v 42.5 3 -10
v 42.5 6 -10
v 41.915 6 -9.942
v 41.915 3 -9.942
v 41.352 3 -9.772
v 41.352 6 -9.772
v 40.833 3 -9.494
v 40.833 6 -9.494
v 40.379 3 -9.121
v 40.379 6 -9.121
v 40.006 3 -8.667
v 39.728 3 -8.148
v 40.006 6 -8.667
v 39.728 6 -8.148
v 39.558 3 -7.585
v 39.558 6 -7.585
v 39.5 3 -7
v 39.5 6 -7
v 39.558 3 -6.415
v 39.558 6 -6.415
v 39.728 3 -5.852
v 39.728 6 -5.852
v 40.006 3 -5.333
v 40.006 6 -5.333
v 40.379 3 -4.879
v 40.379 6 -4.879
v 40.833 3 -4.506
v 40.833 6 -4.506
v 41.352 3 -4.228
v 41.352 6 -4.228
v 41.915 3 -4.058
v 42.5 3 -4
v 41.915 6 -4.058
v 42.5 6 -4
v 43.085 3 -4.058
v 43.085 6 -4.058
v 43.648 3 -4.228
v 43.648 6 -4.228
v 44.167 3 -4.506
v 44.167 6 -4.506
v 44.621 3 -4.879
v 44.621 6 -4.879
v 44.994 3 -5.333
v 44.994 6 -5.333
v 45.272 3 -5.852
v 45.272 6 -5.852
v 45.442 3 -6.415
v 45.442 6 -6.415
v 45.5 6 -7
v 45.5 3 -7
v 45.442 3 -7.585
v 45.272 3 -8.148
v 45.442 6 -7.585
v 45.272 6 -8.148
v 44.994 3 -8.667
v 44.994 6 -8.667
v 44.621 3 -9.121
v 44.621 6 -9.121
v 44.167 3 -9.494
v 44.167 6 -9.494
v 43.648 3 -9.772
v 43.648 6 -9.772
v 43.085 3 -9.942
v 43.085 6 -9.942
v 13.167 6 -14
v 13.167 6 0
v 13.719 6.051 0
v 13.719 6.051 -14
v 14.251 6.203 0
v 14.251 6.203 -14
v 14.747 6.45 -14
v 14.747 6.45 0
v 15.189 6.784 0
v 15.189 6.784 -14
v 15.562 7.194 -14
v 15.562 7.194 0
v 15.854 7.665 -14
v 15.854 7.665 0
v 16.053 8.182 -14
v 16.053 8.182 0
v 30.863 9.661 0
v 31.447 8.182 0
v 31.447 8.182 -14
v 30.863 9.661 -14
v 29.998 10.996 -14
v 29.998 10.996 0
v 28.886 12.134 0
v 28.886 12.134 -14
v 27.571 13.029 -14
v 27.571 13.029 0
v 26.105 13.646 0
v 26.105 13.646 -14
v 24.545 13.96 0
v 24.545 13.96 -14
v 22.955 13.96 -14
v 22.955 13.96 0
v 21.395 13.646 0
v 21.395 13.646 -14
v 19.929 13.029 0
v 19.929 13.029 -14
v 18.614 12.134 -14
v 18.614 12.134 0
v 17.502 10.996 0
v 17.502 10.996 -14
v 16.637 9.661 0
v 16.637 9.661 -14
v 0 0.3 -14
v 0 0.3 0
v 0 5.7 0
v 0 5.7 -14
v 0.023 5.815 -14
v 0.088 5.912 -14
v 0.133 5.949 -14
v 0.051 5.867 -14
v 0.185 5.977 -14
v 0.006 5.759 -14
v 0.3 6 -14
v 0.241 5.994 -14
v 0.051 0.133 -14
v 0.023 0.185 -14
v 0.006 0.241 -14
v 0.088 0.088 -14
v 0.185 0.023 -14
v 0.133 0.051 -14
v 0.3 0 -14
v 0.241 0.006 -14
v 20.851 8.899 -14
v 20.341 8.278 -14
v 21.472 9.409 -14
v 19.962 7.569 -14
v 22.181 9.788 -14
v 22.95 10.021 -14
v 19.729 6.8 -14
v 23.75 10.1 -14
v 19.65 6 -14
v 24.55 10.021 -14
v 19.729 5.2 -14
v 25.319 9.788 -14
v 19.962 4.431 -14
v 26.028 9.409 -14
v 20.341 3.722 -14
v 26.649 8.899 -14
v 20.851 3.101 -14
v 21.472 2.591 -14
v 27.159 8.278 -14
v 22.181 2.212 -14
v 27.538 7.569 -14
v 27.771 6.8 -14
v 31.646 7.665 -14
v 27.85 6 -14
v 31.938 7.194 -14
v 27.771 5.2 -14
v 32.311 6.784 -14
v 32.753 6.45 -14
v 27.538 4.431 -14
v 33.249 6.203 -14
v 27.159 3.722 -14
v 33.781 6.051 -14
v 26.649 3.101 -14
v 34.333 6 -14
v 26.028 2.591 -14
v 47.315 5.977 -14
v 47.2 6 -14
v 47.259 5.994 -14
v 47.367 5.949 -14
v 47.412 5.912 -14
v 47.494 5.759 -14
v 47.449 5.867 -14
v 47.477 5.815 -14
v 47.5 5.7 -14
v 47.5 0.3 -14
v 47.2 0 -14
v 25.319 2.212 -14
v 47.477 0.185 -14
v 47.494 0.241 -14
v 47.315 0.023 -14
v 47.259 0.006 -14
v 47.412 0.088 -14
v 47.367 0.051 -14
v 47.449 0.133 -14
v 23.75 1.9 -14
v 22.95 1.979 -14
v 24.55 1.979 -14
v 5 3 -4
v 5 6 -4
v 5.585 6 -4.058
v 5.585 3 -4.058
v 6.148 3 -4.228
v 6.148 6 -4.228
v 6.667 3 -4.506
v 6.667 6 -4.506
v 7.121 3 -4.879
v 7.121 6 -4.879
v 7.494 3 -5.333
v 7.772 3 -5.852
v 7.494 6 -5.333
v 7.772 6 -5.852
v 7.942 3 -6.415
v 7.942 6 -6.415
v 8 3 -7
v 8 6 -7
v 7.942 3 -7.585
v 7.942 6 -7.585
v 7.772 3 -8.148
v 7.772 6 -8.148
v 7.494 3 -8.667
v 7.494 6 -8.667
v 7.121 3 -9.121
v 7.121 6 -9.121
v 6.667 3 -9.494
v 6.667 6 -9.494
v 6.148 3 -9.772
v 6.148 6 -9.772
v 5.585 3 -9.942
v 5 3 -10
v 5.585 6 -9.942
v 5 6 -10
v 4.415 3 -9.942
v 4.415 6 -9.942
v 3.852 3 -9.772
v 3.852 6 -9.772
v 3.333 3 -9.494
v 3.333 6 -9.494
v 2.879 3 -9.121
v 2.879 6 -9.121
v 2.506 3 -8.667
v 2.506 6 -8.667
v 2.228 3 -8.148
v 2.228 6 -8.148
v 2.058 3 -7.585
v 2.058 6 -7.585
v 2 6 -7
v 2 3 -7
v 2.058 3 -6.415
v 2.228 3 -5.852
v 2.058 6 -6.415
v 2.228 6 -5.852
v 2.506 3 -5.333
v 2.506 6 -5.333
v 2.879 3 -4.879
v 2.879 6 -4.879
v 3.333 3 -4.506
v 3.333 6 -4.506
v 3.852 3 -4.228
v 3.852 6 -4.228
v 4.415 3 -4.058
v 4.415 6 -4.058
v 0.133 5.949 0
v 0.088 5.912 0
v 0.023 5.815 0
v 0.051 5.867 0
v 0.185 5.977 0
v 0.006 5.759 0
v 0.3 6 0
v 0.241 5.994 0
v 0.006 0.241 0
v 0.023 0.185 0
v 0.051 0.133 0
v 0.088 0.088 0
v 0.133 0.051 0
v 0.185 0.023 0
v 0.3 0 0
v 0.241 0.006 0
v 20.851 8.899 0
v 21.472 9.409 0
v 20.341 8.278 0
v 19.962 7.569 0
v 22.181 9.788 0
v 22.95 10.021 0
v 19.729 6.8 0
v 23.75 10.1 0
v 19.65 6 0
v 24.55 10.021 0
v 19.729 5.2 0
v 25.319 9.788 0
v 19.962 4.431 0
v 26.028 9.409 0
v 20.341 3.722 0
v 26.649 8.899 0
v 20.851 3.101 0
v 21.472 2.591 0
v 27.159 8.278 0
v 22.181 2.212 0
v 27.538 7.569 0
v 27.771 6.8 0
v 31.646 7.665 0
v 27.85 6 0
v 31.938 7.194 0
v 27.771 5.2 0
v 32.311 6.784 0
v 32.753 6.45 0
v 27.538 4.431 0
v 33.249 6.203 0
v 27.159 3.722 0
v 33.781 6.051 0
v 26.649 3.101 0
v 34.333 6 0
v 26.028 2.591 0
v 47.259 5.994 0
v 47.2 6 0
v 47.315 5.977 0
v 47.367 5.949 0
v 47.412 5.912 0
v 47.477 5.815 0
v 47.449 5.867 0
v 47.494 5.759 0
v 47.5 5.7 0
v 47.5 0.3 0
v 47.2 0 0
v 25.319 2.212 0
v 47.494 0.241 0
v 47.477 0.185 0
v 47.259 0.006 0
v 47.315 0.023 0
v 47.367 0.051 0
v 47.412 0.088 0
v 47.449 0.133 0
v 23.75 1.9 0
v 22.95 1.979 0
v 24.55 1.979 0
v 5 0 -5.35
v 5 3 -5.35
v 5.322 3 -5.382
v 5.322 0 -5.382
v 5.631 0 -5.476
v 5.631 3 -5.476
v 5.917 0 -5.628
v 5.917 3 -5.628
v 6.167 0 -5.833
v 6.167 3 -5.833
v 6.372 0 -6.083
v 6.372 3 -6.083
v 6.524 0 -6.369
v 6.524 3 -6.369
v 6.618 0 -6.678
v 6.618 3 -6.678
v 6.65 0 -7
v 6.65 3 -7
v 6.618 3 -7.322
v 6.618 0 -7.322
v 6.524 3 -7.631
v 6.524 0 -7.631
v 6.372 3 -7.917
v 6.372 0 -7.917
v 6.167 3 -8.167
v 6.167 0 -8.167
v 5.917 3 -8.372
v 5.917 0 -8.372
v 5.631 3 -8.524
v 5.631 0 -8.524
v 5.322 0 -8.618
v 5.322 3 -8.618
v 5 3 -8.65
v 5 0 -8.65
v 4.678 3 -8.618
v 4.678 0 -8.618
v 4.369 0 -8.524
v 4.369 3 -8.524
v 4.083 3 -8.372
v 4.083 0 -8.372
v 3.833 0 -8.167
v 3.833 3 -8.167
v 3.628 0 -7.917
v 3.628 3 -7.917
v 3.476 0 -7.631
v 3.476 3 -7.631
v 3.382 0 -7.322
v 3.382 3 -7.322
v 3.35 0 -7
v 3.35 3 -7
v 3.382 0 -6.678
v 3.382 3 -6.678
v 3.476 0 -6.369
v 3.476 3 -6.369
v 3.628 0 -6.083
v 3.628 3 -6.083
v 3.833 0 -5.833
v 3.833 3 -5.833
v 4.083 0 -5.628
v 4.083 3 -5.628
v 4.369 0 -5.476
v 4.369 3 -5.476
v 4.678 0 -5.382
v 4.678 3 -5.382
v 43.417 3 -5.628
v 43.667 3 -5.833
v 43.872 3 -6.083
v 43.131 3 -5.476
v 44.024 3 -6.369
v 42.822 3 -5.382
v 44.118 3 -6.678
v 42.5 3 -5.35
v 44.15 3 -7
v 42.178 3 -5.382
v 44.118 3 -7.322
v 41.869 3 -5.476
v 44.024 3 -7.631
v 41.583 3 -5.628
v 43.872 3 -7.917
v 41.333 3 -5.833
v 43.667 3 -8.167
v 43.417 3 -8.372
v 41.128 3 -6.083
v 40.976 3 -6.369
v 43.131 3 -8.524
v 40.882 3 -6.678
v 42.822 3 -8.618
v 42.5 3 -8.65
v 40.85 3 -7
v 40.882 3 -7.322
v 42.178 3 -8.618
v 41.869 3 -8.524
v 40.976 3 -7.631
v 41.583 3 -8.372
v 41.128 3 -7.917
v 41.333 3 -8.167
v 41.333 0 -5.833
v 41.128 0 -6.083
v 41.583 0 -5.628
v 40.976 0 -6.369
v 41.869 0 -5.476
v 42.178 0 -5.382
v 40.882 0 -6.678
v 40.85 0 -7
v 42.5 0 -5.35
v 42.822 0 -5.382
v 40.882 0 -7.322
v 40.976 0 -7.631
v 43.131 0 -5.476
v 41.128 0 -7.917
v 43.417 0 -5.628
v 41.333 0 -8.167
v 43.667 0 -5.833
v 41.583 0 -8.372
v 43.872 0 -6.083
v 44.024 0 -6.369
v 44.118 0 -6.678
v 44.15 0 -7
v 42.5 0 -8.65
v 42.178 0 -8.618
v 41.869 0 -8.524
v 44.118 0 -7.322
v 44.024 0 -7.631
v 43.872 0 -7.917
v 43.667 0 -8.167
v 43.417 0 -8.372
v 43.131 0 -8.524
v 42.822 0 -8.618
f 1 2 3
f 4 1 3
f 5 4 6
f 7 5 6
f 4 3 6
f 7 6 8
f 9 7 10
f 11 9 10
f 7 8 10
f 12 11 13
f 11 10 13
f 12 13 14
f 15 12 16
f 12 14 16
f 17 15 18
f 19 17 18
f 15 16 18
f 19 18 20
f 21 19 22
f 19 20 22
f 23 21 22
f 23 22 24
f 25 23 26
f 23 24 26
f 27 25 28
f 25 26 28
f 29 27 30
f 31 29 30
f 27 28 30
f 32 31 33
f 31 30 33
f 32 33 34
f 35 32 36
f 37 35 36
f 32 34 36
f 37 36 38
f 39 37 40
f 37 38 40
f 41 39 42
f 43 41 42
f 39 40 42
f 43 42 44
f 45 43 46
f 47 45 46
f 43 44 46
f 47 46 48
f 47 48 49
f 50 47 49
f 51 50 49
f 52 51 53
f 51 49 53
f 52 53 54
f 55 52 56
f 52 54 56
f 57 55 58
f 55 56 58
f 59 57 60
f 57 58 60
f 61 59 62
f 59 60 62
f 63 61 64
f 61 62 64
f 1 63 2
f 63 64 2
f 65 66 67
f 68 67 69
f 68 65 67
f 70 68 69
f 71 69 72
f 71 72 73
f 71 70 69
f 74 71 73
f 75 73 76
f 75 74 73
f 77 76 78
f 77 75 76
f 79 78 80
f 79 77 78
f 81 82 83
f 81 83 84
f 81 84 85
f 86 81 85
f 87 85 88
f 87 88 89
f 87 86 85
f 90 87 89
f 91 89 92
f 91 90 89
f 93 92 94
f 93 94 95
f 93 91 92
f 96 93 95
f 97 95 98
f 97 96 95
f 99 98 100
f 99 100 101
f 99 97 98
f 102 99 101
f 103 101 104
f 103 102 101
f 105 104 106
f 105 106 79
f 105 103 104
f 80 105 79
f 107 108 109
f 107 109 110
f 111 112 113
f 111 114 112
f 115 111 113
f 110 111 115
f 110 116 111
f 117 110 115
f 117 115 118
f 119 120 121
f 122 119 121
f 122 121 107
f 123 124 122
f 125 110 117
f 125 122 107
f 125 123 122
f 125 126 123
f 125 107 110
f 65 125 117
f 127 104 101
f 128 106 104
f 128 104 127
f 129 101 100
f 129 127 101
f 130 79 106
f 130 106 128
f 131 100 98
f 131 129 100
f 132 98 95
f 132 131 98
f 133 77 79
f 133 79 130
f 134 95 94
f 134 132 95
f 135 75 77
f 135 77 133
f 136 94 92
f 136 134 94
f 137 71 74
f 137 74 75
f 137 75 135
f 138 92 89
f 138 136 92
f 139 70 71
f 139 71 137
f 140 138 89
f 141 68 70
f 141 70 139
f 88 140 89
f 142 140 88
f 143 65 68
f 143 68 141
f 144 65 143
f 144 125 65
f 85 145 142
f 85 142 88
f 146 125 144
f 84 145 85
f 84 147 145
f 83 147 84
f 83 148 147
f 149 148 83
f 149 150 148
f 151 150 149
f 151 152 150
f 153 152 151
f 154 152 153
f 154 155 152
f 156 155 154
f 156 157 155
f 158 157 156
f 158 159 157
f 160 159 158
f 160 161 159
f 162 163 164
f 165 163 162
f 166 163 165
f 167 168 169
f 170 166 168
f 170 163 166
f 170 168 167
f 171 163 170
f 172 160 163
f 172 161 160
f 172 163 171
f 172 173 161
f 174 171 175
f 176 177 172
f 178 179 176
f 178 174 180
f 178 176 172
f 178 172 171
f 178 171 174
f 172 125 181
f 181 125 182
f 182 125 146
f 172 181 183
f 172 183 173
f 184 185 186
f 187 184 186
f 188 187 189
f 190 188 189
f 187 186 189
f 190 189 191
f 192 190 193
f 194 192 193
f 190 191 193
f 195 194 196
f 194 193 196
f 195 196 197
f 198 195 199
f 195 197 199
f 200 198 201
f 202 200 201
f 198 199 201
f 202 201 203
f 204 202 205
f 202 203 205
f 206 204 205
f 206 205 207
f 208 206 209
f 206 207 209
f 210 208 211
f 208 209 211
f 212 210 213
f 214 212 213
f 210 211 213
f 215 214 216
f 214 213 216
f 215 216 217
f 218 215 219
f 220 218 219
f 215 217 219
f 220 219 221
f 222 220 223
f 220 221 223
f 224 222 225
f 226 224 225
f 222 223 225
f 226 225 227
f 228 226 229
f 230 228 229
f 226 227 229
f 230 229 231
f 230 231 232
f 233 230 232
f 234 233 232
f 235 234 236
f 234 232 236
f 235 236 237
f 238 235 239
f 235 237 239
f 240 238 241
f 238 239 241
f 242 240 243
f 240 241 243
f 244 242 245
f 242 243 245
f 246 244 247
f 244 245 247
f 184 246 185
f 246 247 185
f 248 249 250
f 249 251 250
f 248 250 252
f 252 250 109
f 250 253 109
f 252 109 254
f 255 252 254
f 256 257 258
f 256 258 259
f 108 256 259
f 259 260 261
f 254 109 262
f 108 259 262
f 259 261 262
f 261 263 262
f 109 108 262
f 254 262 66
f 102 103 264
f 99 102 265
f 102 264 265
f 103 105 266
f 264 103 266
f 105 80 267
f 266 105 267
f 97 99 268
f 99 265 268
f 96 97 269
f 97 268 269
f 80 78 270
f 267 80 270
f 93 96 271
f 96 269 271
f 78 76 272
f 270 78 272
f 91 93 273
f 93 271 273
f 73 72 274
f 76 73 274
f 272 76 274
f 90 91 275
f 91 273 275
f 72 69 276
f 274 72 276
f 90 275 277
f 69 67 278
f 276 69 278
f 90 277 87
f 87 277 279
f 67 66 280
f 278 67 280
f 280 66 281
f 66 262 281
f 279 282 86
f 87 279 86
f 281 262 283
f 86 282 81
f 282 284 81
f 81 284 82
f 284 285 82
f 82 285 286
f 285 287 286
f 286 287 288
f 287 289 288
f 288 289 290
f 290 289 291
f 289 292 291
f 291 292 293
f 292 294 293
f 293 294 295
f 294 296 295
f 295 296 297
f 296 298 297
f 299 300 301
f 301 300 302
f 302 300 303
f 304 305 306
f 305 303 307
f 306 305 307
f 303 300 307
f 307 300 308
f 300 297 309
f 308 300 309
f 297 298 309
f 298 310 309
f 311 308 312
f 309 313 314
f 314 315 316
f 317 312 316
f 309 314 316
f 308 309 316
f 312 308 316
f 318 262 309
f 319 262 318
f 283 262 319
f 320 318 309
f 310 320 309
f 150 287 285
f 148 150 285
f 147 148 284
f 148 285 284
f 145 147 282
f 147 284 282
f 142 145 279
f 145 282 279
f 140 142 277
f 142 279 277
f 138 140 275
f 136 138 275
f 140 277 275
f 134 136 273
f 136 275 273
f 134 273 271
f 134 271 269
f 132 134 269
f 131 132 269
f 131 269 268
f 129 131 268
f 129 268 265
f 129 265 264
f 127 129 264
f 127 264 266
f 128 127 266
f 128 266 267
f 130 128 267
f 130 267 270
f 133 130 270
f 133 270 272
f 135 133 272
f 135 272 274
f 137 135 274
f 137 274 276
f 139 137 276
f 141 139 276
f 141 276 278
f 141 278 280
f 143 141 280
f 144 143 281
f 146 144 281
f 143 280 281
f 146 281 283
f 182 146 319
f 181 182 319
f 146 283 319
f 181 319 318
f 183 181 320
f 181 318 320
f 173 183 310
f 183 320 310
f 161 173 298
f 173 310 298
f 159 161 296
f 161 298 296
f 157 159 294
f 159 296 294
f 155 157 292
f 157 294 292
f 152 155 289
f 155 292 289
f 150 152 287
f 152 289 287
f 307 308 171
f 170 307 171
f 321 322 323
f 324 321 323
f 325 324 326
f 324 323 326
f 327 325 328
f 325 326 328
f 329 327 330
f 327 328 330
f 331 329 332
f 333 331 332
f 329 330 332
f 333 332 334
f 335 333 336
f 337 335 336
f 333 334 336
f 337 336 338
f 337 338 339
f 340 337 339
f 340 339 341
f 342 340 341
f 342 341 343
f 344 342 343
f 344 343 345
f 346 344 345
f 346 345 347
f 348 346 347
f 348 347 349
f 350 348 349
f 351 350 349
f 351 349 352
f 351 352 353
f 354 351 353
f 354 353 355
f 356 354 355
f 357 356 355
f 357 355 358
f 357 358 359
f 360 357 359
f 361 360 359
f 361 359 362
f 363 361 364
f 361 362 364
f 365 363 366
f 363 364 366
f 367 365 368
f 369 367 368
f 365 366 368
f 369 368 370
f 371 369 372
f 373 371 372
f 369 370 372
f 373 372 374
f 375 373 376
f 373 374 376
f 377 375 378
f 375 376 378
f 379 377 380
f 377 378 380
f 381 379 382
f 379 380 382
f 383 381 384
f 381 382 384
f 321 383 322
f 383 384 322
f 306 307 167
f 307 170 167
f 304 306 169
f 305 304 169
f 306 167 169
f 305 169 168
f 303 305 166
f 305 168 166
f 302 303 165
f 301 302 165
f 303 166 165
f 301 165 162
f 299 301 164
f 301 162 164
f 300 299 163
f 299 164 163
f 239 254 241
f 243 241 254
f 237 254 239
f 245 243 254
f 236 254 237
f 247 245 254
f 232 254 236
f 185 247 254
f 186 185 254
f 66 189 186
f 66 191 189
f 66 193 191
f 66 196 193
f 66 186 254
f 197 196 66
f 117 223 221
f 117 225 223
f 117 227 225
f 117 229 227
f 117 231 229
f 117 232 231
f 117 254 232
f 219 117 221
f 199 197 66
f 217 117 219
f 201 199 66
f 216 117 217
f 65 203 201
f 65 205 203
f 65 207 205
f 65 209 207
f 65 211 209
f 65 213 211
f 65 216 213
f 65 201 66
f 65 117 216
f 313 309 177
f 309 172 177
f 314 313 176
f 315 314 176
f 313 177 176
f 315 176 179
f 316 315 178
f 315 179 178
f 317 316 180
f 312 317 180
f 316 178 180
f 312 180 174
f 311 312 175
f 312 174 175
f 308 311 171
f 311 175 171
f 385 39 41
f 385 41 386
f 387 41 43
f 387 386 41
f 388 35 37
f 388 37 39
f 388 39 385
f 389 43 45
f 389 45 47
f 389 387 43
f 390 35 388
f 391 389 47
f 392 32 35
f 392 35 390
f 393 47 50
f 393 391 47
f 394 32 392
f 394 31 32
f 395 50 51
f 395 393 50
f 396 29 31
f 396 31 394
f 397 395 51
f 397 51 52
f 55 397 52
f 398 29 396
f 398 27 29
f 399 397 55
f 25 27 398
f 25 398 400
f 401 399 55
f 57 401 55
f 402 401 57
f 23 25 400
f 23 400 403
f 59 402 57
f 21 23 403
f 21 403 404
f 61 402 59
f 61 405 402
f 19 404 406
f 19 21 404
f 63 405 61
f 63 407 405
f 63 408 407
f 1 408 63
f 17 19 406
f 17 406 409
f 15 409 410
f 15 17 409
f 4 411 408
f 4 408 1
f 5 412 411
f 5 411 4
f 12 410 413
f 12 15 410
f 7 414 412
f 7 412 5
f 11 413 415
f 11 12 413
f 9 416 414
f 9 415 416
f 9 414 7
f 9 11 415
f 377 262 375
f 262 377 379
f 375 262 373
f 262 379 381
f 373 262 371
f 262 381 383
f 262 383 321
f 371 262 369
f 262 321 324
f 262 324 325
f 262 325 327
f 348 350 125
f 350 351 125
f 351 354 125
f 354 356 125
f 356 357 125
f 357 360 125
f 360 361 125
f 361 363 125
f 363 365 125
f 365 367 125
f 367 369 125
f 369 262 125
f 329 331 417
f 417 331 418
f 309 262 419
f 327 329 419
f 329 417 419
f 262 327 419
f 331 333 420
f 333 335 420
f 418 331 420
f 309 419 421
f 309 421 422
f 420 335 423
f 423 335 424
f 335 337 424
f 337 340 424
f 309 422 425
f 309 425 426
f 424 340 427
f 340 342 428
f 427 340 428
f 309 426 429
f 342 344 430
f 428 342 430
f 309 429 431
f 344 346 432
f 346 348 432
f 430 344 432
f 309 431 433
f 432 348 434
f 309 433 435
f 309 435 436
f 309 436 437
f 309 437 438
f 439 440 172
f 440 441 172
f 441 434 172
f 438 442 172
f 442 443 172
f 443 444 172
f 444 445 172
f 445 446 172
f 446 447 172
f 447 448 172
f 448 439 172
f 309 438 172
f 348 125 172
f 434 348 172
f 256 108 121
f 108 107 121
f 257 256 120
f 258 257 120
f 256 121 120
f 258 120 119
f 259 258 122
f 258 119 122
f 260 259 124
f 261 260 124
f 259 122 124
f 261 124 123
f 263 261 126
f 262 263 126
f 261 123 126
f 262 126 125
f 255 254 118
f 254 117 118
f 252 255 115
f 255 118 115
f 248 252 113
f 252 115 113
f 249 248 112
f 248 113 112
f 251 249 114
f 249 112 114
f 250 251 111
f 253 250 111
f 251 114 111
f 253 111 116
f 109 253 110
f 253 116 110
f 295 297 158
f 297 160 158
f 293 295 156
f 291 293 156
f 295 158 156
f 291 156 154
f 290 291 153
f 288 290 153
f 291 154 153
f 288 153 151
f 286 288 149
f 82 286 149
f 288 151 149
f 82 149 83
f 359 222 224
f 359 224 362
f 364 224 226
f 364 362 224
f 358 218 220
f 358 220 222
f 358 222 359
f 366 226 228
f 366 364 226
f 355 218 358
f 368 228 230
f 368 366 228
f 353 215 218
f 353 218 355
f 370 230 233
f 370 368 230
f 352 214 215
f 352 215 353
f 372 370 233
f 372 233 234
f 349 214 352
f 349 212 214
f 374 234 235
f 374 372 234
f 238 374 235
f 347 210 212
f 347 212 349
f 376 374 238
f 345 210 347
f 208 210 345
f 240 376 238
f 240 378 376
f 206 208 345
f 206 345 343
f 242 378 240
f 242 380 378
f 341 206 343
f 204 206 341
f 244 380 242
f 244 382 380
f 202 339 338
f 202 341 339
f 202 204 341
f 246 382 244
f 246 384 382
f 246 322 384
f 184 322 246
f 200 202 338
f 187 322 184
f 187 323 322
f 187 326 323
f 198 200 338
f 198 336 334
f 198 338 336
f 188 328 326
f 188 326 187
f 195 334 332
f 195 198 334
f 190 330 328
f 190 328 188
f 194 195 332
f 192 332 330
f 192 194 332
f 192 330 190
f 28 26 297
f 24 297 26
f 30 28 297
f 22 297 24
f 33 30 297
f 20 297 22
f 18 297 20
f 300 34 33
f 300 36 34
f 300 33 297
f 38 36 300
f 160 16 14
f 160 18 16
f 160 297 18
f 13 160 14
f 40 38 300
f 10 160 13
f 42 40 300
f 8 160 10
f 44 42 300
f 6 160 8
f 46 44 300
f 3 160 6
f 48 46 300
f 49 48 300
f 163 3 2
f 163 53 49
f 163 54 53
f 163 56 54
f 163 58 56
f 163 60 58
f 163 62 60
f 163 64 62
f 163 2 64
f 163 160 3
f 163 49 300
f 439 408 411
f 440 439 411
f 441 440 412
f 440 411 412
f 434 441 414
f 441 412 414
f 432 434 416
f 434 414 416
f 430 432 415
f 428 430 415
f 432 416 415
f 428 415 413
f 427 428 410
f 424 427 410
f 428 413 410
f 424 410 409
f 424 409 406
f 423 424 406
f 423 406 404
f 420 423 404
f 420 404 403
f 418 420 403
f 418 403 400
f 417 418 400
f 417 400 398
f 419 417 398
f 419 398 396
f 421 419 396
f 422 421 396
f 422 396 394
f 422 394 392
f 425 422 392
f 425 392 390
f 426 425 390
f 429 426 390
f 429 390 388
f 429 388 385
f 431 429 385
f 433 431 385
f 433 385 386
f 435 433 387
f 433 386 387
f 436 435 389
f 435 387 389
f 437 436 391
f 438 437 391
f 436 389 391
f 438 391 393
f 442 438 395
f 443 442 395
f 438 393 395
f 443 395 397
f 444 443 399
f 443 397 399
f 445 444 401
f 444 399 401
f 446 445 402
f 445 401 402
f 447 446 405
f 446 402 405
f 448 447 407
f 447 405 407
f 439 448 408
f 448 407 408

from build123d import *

# Parameters (mm, degrees)
SKETCH1_W           = 47.5
SKETCH1_H           = 14
BOSS_EXTRUDE1_DEPTH = 6
BOSS_EXTRUDE2_DEPTH = 14
SKETCH4_R           = 4.1
CUT_EXTRUDE1_DEPTH  = 52.461150395
SKETCH5_R           = 1.65
CUT_EXTRUDE2_DEPTH  = 51.162236792
SKETCH6_R           = 3
CUT_EXTRUDE3_DEPTH  = 3
FILLET1_R           = 3
FILLET2_R           = 0.3


with BuildPart() as part:
    # Sketch1 → Boss-Extrude1 (new body)
    with BuildSketch(Plane(origin=(0, 0, 0), x_dir=(1, 0, 0), z_dir=(0, 1, 0))):
        with Locations((23.75, 7)):
            Rectangle(SKETCH1_W, SKETCH1_H)
    extrude(amount=BOSS_EXTRUDE1_DEPTH)

    # Sketch3 → Boss-Extrude2 (add)
    with BuildSketch(Plane.XY):
        with BuildLine():
            Line((15.75, 2.184089353), (16.718725156, 2.184089353))
            Line((16.718725156, 2.184089353), (30.781274844, 2.184089353))
            Line((30.781274844, 2.184089353), (31.75, 2.184089353))
            Line((31.75, 2.184089353), (31.75, 6))
            ThreePointArc((31.75, 6), (23.75, 14), (15.75, 6))
            Line((15.75, 6), (15.75, 2.184089353))
        make_face()
    extrude(amount=-BOSS_EXTRUDE2_DEPTH)

    # Sketch4 → Cut-Extrude1 (cut, through all)
    with BuildSketch(Plane.XY):
        with Locations((23.75, 6)):
            Circle(SKETCH4_R)
    extrude(amount=-CUT_EXTRUDE1_DEPTH, mode=Mode.SUBTRACT)

    # Sketch5 → Cut-Extrude2 (cut, through all)
    with BuildSketch(Plane(origin=(0, 6, 0), x_dir=(1, 0, 0), z_dir=(0, 1, 0))):
        with Locations(Location((5, 7, 0), (0, 0, 270))):
            Circle(SKETCH5_R)
        with Locations(Location((42.5, 7, 0), (0, 0, 90))):
            Circle(SKETCH5_R)
    extrude(amount=-CUT_EXTRUDE2_DEPTH, mode=Mode.SUBTRACT)

    # Sketch6 → Cut-Extrude3 (cut)
    with BuildSketch(Plane(origin=(0, 6, 0), x_dir=(1, 0, 0), z_dir=(0, 1, 0))):
        with Locations(Location((5, 7, 0), (0, 0, 270))):
            Circle(SKETCH6_R)
        with Locations(Location((42.5, 7, 0), (0, 0, 90))):
            Circle(SKETCH6_R)
    extrude(amount=-CUT_EXTRUDE3_DEPTH, mode=Mode.SUBTRACT)

    # Fillet1
    fillet1_edges = [part.edges().sort_by_distance(p)[0] for p in [
        (15.75, 6, -7),
        (31.75, 6, -7),
    ]]
    fillet(fillet1_edges, radius=FILLET1_R)

    # Fillet2
    fillet2_edges = [part.edges().sort_by_distance(p)[0] for p in [
        (47.5, 6, -7),
        (0, 6, -7),
        (47.5, 0, -7),
        (0, 0, -7),
    ]]
    fillet(fillet2_edges, radius=FILLET2_R)


solid = part.part
